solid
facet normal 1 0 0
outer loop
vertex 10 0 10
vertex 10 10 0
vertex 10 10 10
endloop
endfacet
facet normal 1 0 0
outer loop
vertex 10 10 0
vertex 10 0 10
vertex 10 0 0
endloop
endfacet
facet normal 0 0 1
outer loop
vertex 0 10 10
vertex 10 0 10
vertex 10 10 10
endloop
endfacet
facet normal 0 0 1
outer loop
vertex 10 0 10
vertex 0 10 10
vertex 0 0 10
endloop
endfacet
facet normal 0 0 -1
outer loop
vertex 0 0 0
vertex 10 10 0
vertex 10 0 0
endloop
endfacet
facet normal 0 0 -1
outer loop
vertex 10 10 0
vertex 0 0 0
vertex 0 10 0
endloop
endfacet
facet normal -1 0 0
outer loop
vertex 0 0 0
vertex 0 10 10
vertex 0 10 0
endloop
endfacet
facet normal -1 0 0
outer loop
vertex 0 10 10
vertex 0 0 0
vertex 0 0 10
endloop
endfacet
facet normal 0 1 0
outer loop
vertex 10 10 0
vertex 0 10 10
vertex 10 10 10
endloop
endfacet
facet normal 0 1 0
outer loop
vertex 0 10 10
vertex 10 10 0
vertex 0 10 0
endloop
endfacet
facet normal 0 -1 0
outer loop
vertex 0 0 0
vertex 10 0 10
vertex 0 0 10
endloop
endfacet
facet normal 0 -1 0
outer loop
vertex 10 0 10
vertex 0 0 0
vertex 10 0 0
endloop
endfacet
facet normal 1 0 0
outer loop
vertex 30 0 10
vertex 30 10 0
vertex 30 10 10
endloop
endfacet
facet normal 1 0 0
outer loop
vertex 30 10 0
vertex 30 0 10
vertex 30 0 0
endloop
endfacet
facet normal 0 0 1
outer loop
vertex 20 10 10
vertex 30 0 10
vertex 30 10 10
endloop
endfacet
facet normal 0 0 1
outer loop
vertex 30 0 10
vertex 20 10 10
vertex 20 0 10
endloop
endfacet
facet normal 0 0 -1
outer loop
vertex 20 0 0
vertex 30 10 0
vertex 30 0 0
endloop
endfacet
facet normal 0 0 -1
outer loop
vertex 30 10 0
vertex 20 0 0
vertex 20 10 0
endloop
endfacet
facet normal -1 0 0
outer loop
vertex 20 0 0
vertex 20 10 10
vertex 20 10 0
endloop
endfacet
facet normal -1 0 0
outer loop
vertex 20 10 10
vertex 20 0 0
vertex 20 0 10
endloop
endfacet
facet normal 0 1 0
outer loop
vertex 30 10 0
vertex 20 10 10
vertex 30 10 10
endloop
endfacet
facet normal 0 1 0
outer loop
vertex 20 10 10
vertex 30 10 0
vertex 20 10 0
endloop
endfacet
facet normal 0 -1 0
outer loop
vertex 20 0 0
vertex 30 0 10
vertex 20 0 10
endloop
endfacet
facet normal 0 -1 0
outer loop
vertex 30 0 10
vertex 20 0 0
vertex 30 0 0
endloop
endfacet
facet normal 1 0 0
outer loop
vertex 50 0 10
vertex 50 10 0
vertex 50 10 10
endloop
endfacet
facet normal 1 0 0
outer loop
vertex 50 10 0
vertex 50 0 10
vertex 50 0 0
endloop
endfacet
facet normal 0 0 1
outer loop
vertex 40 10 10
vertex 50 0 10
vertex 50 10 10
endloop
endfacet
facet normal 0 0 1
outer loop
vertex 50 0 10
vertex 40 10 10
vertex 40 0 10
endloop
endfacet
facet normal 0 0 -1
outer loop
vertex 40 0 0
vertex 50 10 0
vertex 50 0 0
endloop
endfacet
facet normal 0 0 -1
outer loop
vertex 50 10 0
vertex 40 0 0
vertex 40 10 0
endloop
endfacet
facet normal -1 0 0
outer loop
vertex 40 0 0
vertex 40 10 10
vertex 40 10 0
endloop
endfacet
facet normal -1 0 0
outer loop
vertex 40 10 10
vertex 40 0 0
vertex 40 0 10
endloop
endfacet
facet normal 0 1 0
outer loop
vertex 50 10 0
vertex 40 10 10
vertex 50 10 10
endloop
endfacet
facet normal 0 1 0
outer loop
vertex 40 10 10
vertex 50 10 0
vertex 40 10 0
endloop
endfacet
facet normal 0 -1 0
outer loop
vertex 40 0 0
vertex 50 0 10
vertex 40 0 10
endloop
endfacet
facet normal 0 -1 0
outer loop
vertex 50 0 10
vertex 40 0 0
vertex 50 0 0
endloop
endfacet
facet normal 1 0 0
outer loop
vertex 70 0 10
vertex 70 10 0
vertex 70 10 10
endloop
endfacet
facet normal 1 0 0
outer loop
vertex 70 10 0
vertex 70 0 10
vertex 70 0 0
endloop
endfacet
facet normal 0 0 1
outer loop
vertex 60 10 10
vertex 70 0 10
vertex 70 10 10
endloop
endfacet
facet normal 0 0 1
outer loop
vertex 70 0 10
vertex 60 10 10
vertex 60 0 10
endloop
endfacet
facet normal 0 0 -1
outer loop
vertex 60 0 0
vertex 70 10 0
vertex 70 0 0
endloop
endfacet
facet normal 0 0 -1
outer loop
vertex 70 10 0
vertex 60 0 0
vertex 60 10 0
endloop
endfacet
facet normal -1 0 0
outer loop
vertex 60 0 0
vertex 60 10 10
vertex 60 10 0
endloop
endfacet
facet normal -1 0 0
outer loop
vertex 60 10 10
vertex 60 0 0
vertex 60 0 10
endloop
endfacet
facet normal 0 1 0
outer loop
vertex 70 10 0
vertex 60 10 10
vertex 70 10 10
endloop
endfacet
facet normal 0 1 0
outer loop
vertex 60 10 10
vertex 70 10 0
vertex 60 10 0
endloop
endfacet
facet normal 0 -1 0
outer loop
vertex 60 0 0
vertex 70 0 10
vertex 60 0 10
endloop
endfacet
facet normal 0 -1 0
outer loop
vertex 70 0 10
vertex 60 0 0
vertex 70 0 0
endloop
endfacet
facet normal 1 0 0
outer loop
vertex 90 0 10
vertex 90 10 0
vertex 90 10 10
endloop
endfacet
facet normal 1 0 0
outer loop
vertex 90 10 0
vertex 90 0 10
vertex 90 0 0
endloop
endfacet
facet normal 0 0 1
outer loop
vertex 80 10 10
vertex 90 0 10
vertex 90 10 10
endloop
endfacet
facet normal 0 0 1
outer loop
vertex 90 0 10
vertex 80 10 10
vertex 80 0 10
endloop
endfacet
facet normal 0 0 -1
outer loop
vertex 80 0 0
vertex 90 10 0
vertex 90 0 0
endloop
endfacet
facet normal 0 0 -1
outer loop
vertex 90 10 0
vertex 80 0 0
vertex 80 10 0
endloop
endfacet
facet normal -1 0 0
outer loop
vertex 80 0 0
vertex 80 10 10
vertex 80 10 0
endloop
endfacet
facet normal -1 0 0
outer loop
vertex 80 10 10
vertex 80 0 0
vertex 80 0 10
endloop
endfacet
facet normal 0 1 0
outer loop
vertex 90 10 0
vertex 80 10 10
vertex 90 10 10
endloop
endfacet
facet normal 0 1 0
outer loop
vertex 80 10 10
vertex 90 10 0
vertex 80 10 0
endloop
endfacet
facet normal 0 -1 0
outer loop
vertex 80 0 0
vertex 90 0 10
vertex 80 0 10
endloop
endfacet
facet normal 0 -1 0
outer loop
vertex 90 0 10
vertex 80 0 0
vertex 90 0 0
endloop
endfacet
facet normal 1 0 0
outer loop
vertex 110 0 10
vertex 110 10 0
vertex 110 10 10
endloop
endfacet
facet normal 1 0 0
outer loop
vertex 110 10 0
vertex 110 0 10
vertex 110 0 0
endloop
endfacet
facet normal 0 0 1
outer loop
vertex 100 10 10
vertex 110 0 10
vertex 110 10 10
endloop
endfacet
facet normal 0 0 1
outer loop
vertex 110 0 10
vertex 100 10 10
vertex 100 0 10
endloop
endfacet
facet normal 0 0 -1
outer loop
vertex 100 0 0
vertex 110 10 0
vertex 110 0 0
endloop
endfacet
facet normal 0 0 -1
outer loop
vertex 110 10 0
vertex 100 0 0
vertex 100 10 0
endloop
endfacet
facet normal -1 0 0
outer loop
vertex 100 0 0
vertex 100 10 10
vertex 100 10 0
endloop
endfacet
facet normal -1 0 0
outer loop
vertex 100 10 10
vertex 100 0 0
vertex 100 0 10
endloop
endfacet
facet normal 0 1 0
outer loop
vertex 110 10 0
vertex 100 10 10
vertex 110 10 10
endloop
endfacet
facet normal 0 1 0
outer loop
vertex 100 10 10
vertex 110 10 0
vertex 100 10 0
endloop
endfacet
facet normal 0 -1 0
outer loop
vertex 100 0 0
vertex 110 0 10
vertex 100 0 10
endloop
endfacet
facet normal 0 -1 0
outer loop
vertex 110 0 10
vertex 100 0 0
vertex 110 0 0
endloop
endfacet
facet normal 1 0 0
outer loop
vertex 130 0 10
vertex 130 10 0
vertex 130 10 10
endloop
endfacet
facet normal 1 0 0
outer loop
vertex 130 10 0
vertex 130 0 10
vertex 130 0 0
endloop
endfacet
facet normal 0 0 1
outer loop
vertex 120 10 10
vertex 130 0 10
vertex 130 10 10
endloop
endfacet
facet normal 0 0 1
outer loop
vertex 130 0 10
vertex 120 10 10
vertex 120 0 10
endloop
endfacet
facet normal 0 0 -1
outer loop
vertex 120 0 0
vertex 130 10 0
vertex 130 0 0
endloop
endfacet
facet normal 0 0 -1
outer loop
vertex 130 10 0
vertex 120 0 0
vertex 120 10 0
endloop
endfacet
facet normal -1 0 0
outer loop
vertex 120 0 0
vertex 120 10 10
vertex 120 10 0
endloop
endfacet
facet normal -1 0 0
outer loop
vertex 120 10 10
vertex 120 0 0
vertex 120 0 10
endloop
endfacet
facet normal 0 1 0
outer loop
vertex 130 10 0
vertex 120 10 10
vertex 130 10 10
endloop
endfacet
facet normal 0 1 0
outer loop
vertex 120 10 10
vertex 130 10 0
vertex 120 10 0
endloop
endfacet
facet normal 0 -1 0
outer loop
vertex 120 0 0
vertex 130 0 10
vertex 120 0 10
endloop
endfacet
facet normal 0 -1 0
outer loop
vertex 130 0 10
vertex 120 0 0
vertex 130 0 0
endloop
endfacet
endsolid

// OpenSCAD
        for (i = [0:6]){
            translate(i * [20,0,0])
                cube([10,10,10]);
        }
